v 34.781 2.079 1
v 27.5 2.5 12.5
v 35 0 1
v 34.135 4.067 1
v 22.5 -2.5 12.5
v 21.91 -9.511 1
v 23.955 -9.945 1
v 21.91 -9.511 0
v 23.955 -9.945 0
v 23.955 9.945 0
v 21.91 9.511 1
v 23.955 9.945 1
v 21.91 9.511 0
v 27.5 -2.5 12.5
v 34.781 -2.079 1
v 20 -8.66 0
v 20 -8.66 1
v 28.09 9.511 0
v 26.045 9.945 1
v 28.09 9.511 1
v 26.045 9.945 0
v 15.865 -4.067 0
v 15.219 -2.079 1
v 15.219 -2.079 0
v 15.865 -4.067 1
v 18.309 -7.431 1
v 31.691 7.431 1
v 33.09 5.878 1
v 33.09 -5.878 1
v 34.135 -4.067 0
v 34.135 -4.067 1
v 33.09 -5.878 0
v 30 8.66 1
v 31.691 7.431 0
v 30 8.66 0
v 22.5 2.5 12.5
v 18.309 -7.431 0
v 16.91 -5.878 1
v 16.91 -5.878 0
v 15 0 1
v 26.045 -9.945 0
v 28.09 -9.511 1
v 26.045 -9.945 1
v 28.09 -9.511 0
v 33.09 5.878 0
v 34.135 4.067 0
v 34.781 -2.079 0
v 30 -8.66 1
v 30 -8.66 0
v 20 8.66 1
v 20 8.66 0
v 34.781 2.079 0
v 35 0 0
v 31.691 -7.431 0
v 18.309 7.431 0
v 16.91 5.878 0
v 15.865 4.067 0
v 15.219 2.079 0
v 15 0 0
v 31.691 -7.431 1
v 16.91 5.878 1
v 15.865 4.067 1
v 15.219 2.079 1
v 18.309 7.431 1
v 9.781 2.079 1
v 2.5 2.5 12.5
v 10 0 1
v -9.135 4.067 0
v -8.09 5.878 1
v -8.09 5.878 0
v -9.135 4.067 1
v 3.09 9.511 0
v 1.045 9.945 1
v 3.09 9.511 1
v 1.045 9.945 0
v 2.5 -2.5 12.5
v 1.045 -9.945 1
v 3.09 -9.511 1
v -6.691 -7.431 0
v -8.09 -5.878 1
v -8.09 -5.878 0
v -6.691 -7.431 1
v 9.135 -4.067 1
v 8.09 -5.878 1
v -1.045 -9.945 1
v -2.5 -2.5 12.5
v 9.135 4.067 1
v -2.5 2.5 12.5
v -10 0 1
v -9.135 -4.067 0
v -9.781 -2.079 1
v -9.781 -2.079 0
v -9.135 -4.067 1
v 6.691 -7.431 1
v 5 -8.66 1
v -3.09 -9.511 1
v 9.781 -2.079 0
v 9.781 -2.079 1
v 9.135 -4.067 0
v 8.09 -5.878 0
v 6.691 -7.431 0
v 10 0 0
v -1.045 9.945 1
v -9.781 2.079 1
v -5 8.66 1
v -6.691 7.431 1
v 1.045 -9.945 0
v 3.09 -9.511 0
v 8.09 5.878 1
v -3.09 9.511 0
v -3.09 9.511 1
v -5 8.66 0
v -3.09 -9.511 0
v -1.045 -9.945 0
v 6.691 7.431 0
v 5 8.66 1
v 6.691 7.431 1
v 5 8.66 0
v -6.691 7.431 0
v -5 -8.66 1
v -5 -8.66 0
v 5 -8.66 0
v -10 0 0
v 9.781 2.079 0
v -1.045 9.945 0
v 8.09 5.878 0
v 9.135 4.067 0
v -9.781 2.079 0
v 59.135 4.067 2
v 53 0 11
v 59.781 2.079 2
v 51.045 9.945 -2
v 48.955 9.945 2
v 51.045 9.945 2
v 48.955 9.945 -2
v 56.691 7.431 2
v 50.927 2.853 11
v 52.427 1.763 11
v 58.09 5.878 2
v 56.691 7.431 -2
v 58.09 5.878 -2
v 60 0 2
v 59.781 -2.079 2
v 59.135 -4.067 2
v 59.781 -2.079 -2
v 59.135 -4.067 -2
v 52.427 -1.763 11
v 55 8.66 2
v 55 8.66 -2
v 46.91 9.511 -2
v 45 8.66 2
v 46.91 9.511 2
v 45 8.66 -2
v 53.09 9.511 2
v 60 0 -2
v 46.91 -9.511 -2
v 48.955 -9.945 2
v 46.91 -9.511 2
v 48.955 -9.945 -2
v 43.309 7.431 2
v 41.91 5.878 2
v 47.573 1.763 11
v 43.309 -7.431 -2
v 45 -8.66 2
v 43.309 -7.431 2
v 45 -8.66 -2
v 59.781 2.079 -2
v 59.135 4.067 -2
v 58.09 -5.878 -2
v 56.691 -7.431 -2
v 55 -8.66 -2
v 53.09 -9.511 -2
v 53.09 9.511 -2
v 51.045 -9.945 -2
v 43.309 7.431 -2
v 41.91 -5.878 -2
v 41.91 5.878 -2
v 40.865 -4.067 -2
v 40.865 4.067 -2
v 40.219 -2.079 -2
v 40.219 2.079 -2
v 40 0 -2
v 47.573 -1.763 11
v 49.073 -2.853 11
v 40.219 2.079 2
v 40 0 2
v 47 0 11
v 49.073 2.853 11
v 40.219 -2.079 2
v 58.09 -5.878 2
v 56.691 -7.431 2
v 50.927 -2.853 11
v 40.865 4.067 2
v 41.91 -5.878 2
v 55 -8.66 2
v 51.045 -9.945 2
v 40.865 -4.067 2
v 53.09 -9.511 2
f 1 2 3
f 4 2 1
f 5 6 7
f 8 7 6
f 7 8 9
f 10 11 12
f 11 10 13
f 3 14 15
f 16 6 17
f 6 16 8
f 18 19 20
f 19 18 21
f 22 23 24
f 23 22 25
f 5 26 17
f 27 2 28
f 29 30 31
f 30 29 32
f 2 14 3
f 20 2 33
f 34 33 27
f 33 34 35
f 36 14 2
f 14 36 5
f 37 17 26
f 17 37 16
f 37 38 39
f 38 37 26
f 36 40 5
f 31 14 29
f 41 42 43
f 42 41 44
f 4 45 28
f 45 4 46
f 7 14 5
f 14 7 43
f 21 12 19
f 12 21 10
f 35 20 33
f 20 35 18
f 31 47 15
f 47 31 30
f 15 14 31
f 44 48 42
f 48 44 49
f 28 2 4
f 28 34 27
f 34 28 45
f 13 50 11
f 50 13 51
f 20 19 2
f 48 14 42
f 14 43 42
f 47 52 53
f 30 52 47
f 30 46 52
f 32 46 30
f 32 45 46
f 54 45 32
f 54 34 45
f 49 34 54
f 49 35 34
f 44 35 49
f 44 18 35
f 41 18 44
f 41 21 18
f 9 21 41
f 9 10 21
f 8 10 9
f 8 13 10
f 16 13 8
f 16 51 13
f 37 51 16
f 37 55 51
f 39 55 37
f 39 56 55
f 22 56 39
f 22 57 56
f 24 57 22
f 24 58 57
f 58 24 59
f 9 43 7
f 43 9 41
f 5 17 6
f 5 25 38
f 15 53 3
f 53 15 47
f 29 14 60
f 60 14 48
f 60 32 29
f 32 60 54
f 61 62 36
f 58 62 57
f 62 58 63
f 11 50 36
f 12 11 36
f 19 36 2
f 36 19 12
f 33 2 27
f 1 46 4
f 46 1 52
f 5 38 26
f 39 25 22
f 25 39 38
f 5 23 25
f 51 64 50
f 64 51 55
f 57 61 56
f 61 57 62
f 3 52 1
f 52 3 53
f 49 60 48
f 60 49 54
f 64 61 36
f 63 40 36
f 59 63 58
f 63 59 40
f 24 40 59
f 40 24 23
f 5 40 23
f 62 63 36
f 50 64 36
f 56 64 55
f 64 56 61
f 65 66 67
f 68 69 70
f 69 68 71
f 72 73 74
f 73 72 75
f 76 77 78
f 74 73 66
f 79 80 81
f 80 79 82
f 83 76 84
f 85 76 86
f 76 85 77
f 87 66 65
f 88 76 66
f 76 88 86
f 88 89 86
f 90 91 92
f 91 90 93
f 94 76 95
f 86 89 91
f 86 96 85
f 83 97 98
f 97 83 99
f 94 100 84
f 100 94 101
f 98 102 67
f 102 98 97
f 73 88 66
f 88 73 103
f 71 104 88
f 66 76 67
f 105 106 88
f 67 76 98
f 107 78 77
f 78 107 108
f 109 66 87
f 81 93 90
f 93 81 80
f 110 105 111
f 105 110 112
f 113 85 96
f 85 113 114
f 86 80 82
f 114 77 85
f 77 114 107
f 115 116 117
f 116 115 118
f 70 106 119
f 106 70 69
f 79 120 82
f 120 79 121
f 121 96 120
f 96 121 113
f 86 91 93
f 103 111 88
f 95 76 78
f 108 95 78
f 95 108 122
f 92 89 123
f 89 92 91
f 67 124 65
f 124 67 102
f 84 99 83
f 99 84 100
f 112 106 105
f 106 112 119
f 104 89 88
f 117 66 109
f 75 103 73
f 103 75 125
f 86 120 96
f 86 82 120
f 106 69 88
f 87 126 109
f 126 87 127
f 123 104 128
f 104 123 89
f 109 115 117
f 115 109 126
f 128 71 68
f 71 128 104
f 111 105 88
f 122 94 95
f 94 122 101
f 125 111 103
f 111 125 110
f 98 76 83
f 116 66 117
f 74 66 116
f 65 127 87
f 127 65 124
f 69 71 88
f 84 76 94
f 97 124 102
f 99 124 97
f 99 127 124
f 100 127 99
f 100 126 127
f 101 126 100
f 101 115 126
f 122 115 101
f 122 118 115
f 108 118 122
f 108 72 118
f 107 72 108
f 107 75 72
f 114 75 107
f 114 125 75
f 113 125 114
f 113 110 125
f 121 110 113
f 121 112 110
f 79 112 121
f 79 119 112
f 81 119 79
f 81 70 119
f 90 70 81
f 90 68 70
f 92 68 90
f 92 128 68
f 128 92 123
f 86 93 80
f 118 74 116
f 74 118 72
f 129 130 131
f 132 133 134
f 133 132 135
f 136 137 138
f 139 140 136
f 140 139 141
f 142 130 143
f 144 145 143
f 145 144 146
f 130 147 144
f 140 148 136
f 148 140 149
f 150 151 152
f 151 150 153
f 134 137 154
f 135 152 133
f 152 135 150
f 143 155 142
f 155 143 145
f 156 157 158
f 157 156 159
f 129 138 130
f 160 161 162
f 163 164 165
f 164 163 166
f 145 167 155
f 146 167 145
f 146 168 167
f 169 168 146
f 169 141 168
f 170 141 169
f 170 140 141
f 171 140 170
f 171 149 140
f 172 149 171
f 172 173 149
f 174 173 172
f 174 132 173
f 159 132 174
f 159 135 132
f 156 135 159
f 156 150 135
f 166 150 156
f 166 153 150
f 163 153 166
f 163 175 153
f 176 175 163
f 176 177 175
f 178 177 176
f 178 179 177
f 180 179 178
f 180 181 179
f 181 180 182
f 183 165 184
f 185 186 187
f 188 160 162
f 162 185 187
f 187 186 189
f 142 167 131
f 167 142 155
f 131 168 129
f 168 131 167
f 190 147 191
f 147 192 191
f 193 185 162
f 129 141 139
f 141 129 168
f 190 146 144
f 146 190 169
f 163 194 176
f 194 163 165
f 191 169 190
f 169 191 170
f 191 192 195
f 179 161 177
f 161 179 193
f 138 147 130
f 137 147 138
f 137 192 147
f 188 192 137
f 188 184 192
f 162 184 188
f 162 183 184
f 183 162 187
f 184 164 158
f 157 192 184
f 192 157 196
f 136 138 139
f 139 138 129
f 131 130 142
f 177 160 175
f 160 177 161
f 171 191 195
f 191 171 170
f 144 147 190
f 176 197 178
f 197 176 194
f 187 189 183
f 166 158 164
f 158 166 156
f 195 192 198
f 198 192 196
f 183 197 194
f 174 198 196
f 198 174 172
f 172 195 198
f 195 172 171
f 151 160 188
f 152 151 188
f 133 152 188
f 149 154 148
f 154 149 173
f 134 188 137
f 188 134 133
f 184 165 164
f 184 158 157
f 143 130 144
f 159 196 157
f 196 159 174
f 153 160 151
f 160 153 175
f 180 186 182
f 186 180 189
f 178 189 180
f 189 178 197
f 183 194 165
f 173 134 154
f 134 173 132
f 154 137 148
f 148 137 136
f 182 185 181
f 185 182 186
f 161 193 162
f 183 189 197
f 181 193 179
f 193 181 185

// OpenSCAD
// Volume: 6509.968368744494, SurfaceArea: 2963.479130932844
// Empty
hull();
// No children
hull() { }

// Hull of hull (forces internal cache to be initialized; this has caused a crash earlier)
translate([25,0,0]) hull() hull3test();

module hull3test() {
  hull() {
    cylinder(r=10, h=1);
    translate([0,0,10]) cube([5,5,5], center=true);
  }
}
hull3test();

translate([50,0,0]) hull() {
  translate([0,0,10]) cylinder(r=3);
  difference() {
    cylinder(r=10, h=4, center=true);
    cylinder(r=5, h=5, center=true);
  }
}

// Don't Crash (issue 188)

translate([-5,-5,-5]) {
  hull() {
    intersection() {
      cube([1,1,1]);
      translate([-1,-1,-1]) cube([1,1,1]);
    }
  }
}

module hull3null() {
  hull() {
    cube(0);
    sphere(0);
  }
}
hull3null();
